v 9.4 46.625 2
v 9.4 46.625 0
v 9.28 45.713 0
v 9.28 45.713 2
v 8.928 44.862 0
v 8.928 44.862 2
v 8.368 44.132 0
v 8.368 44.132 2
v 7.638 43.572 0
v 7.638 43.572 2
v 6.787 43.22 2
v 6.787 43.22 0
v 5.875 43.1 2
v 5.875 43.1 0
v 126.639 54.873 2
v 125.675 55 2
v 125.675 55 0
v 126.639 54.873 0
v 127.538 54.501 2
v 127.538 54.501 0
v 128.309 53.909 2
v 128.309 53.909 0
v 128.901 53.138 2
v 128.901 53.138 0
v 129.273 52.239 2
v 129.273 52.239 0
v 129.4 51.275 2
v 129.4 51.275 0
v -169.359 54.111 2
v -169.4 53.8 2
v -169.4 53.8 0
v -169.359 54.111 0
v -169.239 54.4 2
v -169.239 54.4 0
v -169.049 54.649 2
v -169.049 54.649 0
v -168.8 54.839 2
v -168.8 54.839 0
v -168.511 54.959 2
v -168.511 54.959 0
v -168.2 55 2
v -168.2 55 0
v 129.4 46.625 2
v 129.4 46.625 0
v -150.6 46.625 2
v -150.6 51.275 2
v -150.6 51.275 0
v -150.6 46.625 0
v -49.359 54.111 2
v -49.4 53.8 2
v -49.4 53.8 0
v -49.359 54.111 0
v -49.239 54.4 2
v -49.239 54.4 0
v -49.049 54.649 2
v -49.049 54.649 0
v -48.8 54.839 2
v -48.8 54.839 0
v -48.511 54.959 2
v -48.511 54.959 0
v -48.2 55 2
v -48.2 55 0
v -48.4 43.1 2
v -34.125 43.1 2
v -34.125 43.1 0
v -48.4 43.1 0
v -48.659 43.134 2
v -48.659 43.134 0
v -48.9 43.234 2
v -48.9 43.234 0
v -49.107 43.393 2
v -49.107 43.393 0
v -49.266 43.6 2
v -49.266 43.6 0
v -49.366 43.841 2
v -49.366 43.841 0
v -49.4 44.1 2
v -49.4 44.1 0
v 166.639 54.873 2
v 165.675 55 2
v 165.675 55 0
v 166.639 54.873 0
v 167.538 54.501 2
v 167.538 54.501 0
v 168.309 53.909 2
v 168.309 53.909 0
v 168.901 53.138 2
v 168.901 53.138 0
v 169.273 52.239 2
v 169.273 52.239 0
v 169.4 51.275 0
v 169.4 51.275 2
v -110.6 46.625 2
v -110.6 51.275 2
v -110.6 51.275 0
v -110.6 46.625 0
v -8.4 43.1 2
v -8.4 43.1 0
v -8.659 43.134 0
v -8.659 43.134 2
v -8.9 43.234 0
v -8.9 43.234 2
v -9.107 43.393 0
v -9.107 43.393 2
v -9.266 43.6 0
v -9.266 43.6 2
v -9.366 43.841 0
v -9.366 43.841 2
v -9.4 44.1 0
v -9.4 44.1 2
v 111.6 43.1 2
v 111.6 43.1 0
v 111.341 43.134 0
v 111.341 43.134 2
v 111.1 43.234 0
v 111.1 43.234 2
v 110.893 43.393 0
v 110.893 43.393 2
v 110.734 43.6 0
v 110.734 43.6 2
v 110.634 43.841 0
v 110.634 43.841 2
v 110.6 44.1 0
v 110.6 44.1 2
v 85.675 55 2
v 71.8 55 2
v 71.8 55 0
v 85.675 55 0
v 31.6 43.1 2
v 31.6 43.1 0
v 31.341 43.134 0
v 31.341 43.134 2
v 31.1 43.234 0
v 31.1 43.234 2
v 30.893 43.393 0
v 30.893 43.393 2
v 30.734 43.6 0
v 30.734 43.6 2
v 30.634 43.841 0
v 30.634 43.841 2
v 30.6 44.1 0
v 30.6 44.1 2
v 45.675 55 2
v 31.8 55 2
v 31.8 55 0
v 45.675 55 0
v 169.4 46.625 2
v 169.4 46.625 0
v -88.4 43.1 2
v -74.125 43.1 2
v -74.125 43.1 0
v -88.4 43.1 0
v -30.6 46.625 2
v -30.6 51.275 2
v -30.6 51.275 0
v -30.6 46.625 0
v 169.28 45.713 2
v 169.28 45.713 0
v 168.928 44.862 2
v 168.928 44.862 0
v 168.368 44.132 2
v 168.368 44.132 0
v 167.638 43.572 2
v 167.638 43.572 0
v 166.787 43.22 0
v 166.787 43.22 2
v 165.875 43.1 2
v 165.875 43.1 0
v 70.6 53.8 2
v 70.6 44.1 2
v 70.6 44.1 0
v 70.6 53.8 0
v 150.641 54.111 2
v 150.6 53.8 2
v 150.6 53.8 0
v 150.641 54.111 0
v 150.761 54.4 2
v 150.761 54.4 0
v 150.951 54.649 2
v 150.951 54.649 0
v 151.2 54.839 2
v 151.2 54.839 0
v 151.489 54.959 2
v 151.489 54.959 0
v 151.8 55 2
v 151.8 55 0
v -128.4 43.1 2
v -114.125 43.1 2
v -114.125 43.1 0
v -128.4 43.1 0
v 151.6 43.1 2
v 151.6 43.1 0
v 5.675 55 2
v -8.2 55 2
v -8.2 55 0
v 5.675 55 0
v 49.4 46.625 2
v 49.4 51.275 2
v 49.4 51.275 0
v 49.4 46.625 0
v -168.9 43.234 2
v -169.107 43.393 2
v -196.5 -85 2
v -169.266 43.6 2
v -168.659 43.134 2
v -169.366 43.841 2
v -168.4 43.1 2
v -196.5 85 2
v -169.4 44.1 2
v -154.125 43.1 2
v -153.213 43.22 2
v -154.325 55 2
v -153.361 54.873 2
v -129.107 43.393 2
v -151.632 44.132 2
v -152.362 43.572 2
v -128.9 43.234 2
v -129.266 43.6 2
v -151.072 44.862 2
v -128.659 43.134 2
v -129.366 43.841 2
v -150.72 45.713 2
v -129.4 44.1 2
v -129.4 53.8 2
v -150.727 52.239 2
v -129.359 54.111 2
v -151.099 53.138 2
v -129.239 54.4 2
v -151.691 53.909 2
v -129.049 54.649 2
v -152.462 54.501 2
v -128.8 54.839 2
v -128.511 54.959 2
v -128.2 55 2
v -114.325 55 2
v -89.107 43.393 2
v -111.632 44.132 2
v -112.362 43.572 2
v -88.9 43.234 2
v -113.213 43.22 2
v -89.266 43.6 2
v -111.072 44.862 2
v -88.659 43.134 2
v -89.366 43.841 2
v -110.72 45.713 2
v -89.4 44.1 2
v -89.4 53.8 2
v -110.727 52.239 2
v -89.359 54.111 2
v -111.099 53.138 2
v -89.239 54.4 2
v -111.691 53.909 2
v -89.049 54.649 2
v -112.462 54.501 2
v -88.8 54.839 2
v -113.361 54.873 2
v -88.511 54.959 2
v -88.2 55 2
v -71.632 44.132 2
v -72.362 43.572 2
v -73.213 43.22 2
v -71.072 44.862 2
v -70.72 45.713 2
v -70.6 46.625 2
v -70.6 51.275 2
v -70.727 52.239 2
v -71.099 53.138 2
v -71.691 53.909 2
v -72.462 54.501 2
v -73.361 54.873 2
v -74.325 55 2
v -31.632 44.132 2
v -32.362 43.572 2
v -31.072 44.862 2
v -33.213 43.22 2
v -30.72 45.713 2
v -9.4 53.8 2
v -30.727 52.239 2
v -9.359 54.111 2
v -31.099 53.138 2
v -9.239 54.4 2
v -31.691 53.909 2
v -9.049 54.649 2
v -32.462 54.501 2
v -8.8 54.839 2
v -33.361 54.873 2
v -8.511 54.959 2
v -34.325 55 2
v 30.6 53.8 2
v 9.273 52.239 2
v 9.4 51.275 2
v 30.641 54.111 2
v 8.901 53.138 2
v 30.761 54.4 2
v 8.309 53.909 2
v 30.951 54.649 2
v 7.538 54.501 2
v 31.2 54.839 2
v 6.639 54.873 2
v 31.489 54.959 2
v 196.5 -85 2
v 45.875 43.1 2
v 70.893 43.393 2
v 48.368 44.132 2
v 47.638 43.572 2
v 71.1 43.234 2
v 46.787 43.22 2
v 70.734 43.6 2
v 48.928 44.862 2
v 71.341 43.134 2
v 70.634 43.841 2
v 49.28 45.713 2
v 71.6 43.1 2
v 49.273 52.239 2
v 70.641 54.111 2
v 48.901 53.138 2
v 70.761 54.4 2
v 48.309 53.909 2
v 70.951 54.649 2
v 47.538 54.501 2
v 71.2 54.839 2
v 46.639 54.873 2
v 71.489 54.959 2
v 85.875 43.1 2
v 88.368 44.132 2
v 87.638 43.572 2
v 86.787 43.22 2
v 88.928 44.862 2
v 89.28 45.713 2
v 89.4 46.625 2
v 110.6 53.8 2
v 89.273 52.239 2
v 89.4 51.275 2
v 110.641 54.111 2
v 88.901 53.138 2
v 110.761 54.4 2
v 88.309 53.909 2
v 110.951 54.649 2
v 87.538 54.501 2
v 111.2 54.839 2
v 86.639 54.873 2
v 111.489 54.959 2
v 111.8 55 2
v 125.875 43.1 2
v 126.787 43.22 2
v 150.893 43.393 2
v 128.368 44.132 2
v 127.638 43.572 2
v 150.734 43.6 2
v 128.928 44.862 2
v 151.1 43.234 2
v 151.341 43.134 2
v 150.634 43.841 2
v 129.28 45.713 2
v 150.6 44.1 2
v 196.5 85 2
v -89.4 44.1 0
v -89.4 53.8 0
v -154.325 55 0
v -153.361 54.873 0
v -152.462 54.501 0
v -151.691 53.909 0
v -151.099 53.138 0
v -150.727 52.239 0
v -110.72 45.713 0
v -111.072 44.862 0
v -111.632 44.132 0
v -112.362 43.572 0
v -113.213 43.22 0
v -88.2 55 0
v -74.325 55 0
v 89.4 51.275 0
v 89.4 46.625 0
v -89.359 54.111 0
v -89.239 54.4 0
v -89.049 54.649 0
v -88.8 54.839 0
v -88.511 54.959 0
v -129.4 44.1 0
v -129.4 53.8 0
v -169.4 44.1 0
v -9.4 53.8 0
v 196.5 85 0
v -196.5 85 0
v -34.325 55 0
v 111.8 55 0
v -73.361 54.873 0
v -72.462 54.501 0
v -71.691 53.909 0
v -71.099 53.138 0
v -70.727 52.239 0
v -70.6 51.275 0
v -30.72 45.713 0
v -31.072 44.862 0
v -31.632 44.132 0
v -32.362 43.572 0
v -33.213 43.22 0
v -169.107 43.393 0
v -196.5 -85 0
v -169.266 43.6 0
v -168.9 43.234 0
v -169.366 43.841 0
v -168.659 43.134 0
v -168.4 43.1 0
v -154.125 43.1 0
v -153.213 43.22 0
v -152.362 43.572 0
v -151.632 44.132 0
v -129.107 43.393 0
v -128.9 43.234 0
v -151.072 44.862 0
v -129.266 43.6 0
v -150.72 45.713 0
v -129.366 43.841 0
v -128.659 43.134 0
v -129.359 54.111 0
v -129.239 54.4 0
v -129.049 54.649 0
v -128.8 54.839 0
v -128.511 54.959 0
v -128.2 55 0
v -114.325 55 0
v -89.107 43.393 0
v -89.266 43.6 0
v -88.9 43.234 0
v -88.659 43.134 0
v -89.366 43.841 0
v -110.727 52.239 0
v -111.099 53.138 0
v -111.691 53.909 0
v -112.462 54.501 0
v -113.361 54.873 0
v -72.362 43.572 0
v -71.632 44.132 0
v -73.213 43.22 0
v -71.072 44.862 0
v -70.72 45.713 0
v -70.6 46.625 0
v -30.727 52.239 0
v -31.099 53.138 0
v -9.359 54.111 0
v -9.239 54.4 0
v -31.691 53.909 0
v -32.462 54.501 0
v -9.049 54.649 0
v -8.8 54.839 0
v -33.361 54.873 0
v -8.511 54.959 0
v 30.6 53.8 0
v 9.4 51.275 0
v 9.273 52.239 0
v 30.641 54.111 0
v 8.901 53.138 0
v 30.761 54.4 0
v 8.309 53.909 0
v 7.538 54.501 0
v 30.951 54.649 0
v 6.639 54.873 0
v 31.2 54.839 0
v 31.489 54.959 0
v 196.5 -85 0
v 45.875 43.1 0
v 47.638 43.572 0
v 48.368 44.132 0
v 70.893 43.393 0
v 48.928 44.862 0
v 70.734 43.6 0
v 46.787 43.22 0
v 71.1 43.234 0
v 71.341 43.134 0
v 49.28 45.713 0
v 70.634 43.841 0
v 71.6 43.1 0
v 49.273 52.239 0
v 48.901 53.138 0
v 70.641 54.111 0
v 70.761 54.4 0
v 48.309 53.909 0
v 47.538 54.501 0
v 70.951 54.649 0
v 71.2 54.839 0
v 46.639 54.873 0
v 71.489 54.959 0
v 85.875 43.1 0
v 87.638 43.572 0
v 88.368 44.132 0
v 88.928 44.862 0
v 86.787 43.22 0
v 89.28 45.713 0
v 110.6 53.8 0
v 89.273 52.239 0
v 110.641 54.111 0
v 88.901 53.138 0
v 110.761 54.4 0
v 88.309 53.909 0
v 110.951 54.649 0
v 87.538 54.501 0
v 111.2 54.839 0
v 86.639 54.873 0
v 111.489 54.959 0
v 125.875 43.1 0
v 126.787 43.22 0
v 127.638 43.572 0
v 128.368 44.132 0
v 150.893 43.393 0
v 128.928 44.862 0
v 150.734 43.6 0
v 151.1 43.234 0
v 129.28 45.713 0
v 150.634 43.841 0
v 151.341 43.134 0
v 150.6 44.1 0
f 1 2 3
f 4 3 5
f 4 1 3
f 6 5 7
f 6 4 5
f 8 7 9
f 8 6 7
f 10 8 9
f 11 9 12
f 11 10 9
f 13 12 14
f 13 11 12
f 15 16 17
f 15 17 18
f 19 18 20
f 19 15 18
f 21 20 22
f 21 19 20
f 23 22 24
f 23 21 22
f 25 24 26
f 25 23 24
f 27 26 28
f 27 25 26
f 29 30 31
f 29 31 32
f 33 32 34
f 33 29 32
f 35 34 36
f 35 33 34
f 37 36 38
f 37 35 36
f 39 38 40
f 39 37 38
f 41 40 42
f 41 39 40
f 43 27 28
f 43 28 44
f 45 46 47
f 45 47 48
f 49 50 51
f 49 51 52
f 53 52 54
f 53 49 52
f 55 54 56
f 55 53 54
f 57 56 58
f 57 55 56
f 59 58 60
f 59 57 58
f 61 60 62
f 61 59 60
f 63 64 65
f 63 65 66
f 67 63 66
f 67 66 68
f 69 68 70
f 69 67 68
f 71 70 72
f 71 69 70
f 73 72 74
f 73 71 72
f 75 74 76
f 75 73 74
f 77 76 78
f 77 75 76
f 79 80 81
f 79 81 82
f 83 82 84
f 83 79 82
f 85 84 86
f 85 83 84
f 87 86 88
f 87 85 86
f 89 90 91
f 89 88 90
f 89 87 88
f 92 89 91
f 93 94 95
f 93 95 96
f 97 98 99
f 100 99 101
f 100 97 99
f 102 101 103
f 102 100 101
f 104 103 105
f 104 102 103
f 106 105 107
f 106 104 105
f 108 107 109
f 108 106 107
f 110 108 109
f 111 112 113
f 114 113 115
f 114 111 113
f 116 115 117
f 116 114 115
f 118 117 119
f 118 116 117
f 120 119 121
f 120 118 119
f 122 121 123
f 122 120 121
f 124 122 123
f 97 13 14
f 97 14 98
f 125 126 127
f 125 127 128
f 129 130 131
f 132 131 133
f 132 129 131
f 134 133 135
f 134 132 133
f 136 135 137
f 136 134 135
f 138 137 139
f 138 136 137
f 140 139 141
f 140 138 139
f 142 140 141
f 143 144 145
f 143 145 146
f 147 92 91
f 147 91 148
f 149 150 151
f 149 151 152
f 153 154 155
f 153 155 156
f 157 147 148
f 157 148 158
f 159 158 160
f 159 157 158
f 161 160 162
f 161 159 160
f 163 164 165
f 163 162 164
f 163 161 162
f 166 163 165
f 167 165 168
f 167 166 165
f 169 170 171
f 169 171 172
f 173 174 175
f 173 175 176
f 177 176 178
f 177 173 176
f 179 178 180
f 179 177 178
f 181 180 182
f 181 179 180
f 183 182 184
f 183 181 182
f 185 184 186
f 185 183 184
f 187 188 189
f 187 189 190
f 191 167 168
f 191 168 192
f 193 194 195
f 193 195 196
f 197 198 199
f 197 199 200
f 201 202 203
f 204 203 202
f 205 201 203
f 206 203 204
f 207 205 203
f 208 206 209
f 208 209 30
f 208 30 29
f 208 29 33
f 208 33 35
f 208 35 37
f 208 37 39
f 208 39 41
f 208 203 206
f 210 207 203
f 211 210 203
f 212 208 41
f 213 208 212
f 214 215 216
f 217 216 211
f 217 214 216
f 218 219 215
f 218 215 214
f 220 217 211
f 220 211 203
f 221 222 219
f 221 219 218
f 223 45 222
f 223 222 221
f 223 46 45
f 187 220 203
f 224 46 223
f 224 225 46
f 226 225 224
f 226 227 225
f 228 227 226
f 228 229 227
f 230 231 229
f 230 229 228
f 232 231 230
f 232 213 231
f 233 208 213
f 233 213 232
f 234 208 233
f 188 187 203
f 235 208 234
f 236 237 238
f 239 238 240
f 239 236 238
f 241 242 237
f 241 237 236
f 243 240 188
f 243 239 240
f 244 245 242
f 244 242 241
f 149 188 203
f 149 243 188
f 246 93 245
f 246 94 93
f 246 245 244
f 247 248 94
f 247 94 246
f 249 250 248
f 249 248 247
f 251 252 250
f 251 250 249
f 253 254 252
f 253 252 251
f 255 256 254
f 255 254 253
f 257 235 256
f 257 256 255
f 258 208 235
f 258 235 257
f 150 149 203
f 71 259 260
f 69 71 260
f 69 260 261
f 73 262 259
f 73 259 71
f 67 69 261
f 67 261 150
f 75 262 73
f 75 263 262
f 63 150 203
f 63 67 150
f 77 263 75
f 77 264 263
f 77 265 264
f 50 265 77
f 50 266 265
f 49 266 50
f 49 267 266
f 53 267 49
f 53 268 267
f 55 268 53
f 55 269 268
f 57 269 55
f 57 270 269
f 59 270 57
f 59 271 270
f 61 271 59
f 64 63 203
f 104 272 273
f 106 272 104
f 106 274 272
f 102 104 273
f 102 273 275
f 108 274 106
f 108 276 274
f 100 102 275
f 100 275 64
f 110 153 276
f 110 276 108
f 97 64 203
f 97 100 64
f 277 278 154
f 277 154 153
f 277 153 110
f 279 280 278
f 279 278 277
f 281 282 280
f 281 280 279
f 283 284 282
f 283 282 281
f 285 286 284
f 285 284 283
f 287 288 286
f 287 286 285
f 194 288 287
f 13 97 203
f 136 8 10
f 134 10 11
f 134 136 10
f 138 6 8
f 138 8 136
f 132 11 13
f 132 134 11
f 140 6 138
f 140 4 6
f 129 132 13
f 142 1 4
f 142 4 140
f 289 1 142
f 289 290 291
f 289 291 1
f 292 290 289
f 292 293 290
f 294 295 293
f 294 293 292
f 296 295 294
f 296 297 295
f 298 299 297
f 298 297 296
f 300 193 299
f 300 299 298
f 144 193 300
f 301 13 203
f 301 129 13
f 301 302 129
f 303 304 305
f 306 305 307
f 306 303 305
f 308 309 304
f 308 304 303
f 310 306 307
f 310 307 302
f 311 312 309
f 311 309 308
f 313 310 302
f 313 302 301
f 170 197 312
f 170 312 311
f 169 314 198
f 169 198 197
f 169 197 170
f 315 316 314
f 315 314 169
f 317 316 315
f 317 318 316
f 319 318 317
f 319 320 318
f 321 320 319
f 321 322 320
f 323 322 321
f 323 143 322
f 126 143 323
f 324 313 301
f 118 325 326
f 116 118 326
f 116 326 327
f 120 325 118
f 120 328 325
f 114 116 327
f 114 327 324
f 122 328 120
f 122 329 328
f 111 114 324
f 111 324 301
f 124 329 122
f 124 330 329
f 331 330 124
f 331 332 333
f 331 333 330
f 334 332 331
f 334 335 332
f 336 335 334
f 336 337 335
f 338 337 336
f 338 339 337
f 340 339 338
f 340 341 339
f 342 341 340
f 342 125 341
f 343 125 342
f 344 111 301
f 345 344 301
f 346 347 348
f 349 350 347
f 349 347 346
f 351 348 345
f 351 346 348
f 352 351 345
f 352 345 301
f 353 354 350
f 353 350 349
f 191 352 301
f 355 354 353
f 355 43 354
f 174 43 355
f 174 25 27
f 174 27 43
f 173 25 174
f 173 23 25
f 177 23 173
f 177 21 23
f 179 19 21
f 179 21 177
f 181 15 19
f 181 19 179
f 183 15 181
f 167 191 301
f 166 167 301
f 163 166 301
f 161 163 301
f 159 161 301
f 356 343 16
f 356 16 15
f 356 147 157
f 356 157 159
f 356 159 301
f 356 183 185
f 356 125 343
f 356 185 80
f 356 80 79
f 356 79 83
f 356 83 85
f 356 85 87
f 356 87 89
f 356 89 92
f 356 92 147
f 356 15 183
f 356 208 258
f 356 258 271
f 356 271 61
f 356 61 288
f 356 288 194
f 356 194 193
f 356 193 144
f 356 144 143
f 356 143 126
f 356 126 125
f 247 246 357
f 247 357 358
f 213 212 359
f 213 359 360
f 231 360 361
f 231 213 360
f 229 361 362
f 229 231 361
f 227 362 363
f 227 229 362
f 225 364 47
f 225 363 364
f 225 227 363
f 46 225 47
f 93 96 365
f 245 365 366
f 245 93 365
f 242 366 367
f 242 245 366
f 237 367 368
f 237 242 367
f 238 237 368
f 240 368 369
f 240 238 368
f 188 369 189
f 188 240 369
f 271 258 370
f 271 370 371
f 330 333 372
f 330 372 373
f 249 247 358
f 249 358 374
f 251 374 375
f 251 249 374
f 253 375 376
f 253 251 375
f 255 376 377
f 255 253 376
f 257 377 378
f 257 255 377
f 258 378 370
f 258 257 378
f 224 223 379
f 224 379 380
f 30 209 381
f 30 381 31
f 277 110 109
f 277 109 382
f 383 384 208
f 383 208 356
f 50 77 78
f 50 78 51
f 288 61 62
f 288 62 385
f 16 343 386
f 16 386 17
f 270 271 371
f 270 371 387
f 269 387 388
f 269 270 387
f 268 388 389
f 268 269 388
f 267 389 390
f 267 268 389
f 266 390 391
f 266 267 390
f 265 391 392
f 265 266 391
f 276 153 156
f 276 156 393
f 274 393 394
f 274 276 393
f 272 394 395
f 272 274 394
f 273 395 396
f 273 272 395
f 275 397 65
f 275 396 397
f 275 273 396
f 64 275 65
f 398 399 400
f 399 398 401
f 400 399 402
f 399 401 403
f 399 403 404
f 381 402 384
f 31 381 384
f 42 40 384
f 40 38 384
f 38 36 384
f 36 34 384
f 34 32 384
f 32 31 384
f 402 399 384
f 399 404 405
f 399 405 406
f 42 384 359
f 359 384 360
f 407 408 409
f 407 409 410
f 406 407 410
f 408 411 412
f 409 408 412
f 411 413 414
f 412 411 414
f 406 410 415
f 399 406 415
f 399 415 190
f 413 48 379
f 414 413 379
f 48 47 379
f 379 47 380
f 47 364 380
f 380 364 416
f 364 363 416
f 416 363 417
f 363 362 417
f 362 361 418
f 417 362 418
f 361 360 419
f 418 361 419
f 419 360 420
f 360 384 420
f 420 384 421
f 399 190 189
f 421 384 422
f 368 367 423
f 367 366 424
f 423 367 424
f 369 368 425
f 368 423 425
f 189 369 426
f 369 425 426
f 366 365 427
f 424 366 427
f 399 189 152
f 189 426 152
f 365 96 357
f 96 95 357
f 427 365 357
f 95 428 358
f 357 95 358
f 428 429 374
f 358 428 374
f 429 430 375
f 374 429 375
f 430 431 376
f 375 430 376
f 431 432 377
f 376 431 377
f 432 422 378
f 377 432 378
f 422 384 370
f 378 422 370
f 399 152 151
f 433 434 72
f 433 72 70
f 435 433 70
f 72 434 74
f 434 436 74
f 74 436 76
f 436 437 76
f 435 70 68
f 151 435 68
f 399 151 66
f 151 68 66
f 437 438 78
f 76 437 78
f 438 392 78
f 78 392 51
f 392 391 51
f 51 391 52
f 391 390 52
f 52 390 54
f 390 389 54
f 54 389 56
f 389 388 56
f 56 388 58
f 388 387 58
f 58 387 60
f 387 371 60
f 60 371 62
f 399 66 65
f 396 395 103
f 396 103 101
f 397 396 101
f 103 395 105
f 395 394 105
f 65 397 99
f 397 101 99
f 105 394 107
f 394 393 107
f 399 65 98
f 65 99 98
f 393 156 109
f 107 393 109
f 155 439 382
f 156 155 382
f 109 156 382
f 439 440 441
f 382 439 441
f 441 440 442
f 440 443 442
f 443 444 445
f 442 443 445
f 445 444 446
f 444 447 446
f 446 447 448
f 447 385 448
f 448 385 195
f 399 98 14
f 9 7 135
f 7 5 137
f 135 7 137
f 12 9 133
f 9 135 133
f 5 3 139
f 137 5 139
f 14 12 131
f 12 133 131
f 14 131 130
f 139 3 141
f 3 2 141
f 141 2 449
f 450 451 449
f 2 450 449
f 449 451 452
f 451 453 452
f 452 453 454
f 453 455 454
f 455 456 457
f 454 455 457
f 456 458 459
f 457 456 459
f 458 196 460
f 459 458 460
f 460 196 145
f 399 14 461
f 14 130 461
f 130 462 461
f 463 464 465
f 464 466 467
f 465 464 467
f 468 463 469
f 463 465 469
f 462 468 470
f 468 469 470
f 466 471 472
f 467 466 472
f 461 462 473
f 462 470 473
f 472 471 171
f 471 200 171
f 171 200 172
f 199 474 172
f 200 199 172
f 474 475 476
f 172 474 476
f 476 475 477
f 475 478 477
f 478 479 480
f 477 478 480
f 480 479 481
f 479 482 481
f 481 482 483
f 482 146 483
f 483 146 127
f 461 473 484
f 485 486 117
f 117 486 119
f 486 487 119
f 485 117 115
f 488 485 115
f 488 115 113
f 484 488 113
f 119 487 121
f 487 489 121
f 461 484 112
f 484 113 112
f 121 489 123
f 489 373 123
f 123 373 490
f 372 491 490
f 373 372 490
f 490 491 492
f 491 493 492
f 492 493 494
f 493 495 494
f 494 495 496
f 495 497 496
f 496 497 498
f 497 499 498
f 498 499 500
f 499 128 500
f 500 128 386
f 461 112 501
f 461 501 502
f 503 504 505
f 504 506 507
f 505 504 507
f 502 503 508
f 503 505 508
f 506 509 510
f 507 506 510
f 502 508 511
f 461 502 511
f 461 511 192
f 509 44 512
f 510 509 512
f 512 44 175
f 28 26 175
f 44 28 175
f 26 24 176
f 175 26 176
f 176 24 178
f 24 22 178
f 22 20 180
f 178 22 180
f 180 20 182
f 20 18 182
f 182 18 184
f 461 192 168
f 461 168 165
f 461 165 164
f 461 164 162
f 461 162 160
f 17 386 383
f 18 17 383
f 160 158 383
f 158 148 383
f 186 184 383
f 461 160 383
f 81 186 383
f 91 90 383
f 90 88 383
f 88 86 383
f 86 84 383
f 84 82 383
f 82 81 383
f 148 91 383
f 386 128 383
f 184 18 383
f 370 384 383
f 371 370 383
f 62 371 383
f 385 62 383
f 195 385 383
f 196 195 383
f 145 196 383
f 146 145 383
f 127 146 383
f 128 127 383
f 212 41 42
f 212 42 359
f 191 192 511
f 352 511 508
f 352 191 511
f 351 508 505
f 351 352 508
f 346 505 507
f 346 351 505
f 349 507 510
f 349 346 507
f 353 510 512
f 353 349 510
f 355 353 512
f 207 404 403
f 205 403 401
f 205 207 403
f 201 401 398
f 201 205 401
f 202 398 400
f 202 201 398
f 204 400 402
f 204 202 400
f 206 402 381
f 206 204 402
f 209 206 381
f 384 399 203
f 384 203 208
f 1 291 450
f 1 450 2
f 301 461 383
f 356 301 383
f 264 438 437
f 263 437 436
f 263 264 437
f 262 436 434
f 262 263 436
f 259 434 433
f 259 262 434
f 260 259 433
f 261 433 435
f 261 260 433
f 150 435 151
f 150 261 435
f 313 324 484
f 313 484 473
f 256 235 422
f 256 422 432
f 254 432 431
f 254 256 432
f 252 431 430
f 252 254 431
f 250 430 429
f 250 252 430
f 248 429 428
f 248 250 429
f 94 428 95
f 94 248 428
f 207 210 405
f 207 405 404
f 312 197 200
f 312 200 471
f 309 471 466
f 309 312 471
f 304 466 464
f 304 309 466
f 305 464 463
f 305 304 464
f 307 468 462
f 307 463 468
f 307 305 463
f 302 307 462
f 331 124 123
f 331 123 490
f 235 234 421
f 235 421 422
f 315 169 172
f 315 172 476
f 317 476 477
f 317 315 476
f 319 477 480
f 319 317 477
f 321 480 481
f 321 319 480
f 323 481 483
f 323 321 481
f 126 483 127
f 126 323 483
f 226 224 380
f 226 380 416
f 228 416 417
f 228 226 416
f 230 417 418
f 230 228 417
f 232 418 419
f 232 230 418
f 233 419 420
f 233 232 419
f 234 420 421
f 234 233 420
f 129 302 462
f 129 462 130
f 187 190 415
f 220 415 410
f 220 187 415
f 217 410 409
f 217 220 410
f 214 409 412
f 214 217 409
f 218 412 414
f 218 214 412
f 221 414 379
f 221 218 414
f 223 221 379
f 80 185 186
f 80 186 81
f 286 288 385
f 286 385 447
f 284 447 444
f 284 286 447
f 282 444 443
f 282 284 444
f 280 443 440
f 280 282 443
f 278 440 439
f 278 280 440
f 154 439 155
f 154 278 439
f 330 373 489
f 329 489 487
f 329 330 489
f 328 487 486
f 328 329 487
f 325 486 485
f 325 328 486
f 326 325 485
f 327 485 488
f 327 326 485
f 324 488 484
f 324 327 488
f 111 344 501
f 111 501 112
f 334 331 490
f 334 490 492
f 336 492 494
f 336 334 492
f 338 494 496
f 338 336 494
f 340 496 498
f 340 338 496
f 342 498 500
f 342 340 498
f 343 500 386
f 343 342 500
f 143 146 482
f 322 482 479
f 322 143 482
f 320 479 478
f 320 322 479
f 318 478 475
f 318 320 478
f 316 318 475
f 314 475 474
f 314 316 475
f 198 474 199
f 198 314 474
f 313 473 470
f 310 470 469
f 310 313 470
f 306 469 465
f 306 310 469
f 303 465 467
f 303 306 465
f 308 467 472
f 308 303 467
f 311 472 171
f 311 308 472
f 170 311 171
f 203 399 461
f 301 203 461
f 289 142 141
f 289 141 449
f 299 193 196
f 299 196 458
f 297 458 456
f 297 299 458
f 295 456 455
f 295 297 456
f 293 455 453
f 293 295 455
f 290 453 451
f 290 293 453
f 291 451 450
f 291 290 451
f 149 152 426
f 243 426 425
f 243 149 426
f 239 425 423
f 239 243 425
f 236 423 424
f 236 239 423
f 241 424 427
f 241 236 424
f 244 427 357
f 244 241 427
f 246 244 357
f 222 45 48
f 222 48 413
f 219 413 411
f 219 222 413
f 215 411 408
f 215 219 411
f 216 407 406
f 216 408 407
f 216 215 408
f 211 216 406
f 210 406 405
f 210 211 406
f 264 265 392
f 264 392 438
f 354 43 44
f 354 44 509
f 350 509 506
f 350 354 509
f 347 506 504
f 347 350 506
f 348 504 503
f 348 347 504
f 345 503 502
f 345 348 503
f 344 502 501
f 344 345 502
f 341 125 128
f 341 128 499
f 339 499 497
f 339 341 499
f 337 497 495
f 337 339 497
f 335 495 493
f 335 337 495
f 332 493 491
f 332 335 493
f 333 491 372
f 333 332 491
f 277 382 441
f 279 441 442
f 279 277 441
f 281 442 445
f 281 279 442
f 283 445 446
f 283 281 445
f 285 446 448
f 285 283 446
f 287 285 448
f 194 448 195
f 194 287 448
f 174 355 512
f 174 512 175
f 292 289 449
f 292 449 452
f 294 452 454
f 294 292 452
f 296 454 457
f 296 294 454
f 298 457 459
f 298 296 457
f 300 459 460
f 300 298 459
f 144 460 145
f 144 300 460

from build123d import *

# Parameters (mm, degrees)
MODEL_W             = 393
MODEL_H             = 170
BOSS_EXTRUDE1_DEPTH = 2
CUT_EXTRUDE1_DEPTH  = 215.105698196


with BuildPart() as part:
    # Model → Boss-Extrude1 (new body)
    with BuildSketch(Plane.XY):
        Rectangle(MODEL_W, MODEL_H)
    extrude(amount=BOSS_EXTRUDE1_DEPTH)

    # Sketch1 → Cut-Extrude1 (cut, through all)
    with BuildSketch(Plane.XY.offset(2)):
        with BuildLine():
            Line((-154.125, 43.1), (-168.4, 43.1))
            ThreePointArc((-168.4, 43.1), (-169.107106781, 43.392893219), (-169.4, 44.1))
            Line((-169.4, 44.1), (-169.4, 53.8))
            ThreePointArc((-169.4, 53.8), (-169.048528137, 54.648528137), (-168.2, 55))
            Line((-168.2, 55), (-154.325, 55))
            ThreePointArc((-154.325, 55), (-151.69102724, 53.90897276), (-150.6, 51.275))
            Line((-150.6, 51.275), (-150.6, 46.625))
            ThreePointArc((-150.6, 46.625), (-151.632448596, 44.132448596), (-154.125, 43.1))
        make_face()
        with BuildLine():
            Line((-114.125, 43.1), (-128.4, 43.1))
            ThreePointArc((-128.4, 43.1), (-129.107106781, 43.392893219), (-129.4, 44.1))
            Line((-129.4, 44.1), (-129.4, 53.8))
            ThreePointArc((-129.4, 53.8), (-129.048528137, 54.648528137), (-128.2, 55))
            Line((-128.2, 55), (-114.325, 55))
            ThreePointArc((-114.325, 55), (-111.69102724, 53.90897276), (-110.6, 51.275))
            Line((-110.6, 51.275), (-110.6, 46.625))
            ThreePointArc((-110.6, 46.625), (-111.632448596, 44.132448596), (-114.125, 43.1))
        make_face()
        with BuildLine():
            Line((-74.125, 43.1), (-88.4, 43.1))
            ThreePointArc((-88.4, 43.1), (-89.107106781, 43.392893219), (-89.4, 44.1))
            Line((-89.4, 44.1), (-89.4, 53.8))
            ThreePointArc((-89.4, 53.8), (-89.048528137, 54.648528137), (-88.2, 55))
            Line((-88.2, 55), (-74.325, 55))
            ThreePointArc((-74.325, 55), (-71.69102724, 53.90897276), (-70.6, 51.275))
            Line((-70.6, 51.275), (-70.6, 46.625))
            ThreePointArc((-70.6, 46.625), (-71.632448596, 44.132448596), (-74.125, 43.1))
        make_face()
        with BuildLine():
            Line((-34.125, 43.1), (-48.4, 43.1))
            ThreePointArc((-48.4, 43.1), (-49.107106781, 43.392893219), (-49.4, 44.1))
            Line((-49.4, 44.1), (-49.4, 53.8))
            ThreePointArc((-49.4, 53.8), (-49.048528137, 54.648528137), (-48.2, 55))
            Line((-48.2, 55), (-34.325, 55))
            ThreePointArc((-34.325, 55), (-31.69102724, 53.90897276), (-30.6, 51.275))
            Line((-30.6, 51.275), (-30.6, 46.625))
            ThreePointArc((-30.6, 46.625), (-31.632448596, 44.132448596), (-34.125, 43.1))
        make_face()
        with BuildLine():
            Line((5.875, 43.1), (-8.4, 43.1))
            ThreePointArc((-8.4, 43.1), (-9.107106781, 43.392893219), (-9.4, 44.1))
            Line((-9.4, 44.1), (-9.4, 53.8))
            ThreePointArc((-9.4, 53.8), (-9.048528137, 54.648528137), (-8.2, 55))
            Line((-8.2, 55), (5.675, 55))
            ThreePointArc((5.675, 55), (8.30897276, 53.90897276), (9.4, 51.275))
            Line((9.4, 51.275), (9.4, 46.625))
            ThreePointArc((9.4, 46.625), (8.367551404, 44.132448596), (5.875, 43.1))
        make_face()
        with BuildLine():
            Line((45.875, 43.1), (31.6, 43.1))
            ThreePointArc((31.6, 43.1), (30.892893219, 43.392893219), (30.6, 44.1))
            Line((30.6, 44.1), (30.6, 53.8))
            ThreePointArc((30.6, 53.8), (30.951471863, 54.648528137), (31.8, 55))
            Line((31.8, 55), (45.675, 55))
            ThreePointArc((45.675, 55), (48.30897276, 53.90897276), (49.4, 51.275))
            Line((49.4, 51.275), (49.4, 46.625))
            ThreePointArc((49.4, 46.625), (48.367551404, 44.132448596), (45.875, 43.1))
        make_face()
        with BuildLine():
            Line((85.875, 43.1), (71.6, 43.1))
            ThreePointArc((71.6, 43.1), (70.892893219, 43.392893219), (70.6, 44.1))
            Line((70.6, 44.1), (70.6, 53.8))
            ThreePointArc((70.6, 53.8), (70.951471863, 54.648528137), (71.8, 55))
            Line((71.8, 55), (85.675, 55))
            ThreePointArc((85.675, 55), (88.30897276, 53.90897276), (89.4, 51.275))
            Line((89.4, 51.275), (89.4, 46.625))
            ThreePointArc((89.4, 46.625), (88.367551404, 44.132448596), (85.875, 43.1))
        make_face()
        with BuildLine():
            Line((125.875, 43.1), (111.6, 43.1))
            ThreePointArc((111.6, 43.1), (110.892893219, 43.392893219), (110.6, 44.1))
            Line((110.6, 44.1), (110.6, 53.8))
            ThreePointArc((110.6, 53.8), (110.951471863, 54.648528137), (111.8, 55))
            Line((111.8, 55), (125.675, 55))
            ThreePointArc((125.675, 55), (128.30897276, 53.90897276), (129.4, 51.275))
            Line((129.4, 51.275), (129.4, 46.625))
            ThreePointArc((129.4, 46.625), (128.367551404, 44.132448596), (125.875, 43.1))
        make_face()
        with BuildLine():
            Line((165.875, 43.1), (151.6, 43.1))
            ThreePointArc((151.6, 43.1), (150.892893219, 43.392893219), (150.6, 44.1))
            Line((150.6, 44.1), (150.6, 53.8))
            ThreePointArc((150.6, 53.8), (150.951471863, 54.648528137), (151.8, 55))
            Line((151.8, 55), (165.675, 55))
            ThreePointArc((165.675, 55), (168.30897276, 53.90897276), (169.4, 51.275))
            Line((169.4, 51.275), (169.4, 46.625))
            ThreePointArc((169.4, 46.625), (168.367551404, 44.132448596), (165.875, 43.1))
        make_face()
    extrude(amount=-CUT_EXTRUDE1_DEPTH, mode=Mode.SUBTRACT)


solid = part.part
